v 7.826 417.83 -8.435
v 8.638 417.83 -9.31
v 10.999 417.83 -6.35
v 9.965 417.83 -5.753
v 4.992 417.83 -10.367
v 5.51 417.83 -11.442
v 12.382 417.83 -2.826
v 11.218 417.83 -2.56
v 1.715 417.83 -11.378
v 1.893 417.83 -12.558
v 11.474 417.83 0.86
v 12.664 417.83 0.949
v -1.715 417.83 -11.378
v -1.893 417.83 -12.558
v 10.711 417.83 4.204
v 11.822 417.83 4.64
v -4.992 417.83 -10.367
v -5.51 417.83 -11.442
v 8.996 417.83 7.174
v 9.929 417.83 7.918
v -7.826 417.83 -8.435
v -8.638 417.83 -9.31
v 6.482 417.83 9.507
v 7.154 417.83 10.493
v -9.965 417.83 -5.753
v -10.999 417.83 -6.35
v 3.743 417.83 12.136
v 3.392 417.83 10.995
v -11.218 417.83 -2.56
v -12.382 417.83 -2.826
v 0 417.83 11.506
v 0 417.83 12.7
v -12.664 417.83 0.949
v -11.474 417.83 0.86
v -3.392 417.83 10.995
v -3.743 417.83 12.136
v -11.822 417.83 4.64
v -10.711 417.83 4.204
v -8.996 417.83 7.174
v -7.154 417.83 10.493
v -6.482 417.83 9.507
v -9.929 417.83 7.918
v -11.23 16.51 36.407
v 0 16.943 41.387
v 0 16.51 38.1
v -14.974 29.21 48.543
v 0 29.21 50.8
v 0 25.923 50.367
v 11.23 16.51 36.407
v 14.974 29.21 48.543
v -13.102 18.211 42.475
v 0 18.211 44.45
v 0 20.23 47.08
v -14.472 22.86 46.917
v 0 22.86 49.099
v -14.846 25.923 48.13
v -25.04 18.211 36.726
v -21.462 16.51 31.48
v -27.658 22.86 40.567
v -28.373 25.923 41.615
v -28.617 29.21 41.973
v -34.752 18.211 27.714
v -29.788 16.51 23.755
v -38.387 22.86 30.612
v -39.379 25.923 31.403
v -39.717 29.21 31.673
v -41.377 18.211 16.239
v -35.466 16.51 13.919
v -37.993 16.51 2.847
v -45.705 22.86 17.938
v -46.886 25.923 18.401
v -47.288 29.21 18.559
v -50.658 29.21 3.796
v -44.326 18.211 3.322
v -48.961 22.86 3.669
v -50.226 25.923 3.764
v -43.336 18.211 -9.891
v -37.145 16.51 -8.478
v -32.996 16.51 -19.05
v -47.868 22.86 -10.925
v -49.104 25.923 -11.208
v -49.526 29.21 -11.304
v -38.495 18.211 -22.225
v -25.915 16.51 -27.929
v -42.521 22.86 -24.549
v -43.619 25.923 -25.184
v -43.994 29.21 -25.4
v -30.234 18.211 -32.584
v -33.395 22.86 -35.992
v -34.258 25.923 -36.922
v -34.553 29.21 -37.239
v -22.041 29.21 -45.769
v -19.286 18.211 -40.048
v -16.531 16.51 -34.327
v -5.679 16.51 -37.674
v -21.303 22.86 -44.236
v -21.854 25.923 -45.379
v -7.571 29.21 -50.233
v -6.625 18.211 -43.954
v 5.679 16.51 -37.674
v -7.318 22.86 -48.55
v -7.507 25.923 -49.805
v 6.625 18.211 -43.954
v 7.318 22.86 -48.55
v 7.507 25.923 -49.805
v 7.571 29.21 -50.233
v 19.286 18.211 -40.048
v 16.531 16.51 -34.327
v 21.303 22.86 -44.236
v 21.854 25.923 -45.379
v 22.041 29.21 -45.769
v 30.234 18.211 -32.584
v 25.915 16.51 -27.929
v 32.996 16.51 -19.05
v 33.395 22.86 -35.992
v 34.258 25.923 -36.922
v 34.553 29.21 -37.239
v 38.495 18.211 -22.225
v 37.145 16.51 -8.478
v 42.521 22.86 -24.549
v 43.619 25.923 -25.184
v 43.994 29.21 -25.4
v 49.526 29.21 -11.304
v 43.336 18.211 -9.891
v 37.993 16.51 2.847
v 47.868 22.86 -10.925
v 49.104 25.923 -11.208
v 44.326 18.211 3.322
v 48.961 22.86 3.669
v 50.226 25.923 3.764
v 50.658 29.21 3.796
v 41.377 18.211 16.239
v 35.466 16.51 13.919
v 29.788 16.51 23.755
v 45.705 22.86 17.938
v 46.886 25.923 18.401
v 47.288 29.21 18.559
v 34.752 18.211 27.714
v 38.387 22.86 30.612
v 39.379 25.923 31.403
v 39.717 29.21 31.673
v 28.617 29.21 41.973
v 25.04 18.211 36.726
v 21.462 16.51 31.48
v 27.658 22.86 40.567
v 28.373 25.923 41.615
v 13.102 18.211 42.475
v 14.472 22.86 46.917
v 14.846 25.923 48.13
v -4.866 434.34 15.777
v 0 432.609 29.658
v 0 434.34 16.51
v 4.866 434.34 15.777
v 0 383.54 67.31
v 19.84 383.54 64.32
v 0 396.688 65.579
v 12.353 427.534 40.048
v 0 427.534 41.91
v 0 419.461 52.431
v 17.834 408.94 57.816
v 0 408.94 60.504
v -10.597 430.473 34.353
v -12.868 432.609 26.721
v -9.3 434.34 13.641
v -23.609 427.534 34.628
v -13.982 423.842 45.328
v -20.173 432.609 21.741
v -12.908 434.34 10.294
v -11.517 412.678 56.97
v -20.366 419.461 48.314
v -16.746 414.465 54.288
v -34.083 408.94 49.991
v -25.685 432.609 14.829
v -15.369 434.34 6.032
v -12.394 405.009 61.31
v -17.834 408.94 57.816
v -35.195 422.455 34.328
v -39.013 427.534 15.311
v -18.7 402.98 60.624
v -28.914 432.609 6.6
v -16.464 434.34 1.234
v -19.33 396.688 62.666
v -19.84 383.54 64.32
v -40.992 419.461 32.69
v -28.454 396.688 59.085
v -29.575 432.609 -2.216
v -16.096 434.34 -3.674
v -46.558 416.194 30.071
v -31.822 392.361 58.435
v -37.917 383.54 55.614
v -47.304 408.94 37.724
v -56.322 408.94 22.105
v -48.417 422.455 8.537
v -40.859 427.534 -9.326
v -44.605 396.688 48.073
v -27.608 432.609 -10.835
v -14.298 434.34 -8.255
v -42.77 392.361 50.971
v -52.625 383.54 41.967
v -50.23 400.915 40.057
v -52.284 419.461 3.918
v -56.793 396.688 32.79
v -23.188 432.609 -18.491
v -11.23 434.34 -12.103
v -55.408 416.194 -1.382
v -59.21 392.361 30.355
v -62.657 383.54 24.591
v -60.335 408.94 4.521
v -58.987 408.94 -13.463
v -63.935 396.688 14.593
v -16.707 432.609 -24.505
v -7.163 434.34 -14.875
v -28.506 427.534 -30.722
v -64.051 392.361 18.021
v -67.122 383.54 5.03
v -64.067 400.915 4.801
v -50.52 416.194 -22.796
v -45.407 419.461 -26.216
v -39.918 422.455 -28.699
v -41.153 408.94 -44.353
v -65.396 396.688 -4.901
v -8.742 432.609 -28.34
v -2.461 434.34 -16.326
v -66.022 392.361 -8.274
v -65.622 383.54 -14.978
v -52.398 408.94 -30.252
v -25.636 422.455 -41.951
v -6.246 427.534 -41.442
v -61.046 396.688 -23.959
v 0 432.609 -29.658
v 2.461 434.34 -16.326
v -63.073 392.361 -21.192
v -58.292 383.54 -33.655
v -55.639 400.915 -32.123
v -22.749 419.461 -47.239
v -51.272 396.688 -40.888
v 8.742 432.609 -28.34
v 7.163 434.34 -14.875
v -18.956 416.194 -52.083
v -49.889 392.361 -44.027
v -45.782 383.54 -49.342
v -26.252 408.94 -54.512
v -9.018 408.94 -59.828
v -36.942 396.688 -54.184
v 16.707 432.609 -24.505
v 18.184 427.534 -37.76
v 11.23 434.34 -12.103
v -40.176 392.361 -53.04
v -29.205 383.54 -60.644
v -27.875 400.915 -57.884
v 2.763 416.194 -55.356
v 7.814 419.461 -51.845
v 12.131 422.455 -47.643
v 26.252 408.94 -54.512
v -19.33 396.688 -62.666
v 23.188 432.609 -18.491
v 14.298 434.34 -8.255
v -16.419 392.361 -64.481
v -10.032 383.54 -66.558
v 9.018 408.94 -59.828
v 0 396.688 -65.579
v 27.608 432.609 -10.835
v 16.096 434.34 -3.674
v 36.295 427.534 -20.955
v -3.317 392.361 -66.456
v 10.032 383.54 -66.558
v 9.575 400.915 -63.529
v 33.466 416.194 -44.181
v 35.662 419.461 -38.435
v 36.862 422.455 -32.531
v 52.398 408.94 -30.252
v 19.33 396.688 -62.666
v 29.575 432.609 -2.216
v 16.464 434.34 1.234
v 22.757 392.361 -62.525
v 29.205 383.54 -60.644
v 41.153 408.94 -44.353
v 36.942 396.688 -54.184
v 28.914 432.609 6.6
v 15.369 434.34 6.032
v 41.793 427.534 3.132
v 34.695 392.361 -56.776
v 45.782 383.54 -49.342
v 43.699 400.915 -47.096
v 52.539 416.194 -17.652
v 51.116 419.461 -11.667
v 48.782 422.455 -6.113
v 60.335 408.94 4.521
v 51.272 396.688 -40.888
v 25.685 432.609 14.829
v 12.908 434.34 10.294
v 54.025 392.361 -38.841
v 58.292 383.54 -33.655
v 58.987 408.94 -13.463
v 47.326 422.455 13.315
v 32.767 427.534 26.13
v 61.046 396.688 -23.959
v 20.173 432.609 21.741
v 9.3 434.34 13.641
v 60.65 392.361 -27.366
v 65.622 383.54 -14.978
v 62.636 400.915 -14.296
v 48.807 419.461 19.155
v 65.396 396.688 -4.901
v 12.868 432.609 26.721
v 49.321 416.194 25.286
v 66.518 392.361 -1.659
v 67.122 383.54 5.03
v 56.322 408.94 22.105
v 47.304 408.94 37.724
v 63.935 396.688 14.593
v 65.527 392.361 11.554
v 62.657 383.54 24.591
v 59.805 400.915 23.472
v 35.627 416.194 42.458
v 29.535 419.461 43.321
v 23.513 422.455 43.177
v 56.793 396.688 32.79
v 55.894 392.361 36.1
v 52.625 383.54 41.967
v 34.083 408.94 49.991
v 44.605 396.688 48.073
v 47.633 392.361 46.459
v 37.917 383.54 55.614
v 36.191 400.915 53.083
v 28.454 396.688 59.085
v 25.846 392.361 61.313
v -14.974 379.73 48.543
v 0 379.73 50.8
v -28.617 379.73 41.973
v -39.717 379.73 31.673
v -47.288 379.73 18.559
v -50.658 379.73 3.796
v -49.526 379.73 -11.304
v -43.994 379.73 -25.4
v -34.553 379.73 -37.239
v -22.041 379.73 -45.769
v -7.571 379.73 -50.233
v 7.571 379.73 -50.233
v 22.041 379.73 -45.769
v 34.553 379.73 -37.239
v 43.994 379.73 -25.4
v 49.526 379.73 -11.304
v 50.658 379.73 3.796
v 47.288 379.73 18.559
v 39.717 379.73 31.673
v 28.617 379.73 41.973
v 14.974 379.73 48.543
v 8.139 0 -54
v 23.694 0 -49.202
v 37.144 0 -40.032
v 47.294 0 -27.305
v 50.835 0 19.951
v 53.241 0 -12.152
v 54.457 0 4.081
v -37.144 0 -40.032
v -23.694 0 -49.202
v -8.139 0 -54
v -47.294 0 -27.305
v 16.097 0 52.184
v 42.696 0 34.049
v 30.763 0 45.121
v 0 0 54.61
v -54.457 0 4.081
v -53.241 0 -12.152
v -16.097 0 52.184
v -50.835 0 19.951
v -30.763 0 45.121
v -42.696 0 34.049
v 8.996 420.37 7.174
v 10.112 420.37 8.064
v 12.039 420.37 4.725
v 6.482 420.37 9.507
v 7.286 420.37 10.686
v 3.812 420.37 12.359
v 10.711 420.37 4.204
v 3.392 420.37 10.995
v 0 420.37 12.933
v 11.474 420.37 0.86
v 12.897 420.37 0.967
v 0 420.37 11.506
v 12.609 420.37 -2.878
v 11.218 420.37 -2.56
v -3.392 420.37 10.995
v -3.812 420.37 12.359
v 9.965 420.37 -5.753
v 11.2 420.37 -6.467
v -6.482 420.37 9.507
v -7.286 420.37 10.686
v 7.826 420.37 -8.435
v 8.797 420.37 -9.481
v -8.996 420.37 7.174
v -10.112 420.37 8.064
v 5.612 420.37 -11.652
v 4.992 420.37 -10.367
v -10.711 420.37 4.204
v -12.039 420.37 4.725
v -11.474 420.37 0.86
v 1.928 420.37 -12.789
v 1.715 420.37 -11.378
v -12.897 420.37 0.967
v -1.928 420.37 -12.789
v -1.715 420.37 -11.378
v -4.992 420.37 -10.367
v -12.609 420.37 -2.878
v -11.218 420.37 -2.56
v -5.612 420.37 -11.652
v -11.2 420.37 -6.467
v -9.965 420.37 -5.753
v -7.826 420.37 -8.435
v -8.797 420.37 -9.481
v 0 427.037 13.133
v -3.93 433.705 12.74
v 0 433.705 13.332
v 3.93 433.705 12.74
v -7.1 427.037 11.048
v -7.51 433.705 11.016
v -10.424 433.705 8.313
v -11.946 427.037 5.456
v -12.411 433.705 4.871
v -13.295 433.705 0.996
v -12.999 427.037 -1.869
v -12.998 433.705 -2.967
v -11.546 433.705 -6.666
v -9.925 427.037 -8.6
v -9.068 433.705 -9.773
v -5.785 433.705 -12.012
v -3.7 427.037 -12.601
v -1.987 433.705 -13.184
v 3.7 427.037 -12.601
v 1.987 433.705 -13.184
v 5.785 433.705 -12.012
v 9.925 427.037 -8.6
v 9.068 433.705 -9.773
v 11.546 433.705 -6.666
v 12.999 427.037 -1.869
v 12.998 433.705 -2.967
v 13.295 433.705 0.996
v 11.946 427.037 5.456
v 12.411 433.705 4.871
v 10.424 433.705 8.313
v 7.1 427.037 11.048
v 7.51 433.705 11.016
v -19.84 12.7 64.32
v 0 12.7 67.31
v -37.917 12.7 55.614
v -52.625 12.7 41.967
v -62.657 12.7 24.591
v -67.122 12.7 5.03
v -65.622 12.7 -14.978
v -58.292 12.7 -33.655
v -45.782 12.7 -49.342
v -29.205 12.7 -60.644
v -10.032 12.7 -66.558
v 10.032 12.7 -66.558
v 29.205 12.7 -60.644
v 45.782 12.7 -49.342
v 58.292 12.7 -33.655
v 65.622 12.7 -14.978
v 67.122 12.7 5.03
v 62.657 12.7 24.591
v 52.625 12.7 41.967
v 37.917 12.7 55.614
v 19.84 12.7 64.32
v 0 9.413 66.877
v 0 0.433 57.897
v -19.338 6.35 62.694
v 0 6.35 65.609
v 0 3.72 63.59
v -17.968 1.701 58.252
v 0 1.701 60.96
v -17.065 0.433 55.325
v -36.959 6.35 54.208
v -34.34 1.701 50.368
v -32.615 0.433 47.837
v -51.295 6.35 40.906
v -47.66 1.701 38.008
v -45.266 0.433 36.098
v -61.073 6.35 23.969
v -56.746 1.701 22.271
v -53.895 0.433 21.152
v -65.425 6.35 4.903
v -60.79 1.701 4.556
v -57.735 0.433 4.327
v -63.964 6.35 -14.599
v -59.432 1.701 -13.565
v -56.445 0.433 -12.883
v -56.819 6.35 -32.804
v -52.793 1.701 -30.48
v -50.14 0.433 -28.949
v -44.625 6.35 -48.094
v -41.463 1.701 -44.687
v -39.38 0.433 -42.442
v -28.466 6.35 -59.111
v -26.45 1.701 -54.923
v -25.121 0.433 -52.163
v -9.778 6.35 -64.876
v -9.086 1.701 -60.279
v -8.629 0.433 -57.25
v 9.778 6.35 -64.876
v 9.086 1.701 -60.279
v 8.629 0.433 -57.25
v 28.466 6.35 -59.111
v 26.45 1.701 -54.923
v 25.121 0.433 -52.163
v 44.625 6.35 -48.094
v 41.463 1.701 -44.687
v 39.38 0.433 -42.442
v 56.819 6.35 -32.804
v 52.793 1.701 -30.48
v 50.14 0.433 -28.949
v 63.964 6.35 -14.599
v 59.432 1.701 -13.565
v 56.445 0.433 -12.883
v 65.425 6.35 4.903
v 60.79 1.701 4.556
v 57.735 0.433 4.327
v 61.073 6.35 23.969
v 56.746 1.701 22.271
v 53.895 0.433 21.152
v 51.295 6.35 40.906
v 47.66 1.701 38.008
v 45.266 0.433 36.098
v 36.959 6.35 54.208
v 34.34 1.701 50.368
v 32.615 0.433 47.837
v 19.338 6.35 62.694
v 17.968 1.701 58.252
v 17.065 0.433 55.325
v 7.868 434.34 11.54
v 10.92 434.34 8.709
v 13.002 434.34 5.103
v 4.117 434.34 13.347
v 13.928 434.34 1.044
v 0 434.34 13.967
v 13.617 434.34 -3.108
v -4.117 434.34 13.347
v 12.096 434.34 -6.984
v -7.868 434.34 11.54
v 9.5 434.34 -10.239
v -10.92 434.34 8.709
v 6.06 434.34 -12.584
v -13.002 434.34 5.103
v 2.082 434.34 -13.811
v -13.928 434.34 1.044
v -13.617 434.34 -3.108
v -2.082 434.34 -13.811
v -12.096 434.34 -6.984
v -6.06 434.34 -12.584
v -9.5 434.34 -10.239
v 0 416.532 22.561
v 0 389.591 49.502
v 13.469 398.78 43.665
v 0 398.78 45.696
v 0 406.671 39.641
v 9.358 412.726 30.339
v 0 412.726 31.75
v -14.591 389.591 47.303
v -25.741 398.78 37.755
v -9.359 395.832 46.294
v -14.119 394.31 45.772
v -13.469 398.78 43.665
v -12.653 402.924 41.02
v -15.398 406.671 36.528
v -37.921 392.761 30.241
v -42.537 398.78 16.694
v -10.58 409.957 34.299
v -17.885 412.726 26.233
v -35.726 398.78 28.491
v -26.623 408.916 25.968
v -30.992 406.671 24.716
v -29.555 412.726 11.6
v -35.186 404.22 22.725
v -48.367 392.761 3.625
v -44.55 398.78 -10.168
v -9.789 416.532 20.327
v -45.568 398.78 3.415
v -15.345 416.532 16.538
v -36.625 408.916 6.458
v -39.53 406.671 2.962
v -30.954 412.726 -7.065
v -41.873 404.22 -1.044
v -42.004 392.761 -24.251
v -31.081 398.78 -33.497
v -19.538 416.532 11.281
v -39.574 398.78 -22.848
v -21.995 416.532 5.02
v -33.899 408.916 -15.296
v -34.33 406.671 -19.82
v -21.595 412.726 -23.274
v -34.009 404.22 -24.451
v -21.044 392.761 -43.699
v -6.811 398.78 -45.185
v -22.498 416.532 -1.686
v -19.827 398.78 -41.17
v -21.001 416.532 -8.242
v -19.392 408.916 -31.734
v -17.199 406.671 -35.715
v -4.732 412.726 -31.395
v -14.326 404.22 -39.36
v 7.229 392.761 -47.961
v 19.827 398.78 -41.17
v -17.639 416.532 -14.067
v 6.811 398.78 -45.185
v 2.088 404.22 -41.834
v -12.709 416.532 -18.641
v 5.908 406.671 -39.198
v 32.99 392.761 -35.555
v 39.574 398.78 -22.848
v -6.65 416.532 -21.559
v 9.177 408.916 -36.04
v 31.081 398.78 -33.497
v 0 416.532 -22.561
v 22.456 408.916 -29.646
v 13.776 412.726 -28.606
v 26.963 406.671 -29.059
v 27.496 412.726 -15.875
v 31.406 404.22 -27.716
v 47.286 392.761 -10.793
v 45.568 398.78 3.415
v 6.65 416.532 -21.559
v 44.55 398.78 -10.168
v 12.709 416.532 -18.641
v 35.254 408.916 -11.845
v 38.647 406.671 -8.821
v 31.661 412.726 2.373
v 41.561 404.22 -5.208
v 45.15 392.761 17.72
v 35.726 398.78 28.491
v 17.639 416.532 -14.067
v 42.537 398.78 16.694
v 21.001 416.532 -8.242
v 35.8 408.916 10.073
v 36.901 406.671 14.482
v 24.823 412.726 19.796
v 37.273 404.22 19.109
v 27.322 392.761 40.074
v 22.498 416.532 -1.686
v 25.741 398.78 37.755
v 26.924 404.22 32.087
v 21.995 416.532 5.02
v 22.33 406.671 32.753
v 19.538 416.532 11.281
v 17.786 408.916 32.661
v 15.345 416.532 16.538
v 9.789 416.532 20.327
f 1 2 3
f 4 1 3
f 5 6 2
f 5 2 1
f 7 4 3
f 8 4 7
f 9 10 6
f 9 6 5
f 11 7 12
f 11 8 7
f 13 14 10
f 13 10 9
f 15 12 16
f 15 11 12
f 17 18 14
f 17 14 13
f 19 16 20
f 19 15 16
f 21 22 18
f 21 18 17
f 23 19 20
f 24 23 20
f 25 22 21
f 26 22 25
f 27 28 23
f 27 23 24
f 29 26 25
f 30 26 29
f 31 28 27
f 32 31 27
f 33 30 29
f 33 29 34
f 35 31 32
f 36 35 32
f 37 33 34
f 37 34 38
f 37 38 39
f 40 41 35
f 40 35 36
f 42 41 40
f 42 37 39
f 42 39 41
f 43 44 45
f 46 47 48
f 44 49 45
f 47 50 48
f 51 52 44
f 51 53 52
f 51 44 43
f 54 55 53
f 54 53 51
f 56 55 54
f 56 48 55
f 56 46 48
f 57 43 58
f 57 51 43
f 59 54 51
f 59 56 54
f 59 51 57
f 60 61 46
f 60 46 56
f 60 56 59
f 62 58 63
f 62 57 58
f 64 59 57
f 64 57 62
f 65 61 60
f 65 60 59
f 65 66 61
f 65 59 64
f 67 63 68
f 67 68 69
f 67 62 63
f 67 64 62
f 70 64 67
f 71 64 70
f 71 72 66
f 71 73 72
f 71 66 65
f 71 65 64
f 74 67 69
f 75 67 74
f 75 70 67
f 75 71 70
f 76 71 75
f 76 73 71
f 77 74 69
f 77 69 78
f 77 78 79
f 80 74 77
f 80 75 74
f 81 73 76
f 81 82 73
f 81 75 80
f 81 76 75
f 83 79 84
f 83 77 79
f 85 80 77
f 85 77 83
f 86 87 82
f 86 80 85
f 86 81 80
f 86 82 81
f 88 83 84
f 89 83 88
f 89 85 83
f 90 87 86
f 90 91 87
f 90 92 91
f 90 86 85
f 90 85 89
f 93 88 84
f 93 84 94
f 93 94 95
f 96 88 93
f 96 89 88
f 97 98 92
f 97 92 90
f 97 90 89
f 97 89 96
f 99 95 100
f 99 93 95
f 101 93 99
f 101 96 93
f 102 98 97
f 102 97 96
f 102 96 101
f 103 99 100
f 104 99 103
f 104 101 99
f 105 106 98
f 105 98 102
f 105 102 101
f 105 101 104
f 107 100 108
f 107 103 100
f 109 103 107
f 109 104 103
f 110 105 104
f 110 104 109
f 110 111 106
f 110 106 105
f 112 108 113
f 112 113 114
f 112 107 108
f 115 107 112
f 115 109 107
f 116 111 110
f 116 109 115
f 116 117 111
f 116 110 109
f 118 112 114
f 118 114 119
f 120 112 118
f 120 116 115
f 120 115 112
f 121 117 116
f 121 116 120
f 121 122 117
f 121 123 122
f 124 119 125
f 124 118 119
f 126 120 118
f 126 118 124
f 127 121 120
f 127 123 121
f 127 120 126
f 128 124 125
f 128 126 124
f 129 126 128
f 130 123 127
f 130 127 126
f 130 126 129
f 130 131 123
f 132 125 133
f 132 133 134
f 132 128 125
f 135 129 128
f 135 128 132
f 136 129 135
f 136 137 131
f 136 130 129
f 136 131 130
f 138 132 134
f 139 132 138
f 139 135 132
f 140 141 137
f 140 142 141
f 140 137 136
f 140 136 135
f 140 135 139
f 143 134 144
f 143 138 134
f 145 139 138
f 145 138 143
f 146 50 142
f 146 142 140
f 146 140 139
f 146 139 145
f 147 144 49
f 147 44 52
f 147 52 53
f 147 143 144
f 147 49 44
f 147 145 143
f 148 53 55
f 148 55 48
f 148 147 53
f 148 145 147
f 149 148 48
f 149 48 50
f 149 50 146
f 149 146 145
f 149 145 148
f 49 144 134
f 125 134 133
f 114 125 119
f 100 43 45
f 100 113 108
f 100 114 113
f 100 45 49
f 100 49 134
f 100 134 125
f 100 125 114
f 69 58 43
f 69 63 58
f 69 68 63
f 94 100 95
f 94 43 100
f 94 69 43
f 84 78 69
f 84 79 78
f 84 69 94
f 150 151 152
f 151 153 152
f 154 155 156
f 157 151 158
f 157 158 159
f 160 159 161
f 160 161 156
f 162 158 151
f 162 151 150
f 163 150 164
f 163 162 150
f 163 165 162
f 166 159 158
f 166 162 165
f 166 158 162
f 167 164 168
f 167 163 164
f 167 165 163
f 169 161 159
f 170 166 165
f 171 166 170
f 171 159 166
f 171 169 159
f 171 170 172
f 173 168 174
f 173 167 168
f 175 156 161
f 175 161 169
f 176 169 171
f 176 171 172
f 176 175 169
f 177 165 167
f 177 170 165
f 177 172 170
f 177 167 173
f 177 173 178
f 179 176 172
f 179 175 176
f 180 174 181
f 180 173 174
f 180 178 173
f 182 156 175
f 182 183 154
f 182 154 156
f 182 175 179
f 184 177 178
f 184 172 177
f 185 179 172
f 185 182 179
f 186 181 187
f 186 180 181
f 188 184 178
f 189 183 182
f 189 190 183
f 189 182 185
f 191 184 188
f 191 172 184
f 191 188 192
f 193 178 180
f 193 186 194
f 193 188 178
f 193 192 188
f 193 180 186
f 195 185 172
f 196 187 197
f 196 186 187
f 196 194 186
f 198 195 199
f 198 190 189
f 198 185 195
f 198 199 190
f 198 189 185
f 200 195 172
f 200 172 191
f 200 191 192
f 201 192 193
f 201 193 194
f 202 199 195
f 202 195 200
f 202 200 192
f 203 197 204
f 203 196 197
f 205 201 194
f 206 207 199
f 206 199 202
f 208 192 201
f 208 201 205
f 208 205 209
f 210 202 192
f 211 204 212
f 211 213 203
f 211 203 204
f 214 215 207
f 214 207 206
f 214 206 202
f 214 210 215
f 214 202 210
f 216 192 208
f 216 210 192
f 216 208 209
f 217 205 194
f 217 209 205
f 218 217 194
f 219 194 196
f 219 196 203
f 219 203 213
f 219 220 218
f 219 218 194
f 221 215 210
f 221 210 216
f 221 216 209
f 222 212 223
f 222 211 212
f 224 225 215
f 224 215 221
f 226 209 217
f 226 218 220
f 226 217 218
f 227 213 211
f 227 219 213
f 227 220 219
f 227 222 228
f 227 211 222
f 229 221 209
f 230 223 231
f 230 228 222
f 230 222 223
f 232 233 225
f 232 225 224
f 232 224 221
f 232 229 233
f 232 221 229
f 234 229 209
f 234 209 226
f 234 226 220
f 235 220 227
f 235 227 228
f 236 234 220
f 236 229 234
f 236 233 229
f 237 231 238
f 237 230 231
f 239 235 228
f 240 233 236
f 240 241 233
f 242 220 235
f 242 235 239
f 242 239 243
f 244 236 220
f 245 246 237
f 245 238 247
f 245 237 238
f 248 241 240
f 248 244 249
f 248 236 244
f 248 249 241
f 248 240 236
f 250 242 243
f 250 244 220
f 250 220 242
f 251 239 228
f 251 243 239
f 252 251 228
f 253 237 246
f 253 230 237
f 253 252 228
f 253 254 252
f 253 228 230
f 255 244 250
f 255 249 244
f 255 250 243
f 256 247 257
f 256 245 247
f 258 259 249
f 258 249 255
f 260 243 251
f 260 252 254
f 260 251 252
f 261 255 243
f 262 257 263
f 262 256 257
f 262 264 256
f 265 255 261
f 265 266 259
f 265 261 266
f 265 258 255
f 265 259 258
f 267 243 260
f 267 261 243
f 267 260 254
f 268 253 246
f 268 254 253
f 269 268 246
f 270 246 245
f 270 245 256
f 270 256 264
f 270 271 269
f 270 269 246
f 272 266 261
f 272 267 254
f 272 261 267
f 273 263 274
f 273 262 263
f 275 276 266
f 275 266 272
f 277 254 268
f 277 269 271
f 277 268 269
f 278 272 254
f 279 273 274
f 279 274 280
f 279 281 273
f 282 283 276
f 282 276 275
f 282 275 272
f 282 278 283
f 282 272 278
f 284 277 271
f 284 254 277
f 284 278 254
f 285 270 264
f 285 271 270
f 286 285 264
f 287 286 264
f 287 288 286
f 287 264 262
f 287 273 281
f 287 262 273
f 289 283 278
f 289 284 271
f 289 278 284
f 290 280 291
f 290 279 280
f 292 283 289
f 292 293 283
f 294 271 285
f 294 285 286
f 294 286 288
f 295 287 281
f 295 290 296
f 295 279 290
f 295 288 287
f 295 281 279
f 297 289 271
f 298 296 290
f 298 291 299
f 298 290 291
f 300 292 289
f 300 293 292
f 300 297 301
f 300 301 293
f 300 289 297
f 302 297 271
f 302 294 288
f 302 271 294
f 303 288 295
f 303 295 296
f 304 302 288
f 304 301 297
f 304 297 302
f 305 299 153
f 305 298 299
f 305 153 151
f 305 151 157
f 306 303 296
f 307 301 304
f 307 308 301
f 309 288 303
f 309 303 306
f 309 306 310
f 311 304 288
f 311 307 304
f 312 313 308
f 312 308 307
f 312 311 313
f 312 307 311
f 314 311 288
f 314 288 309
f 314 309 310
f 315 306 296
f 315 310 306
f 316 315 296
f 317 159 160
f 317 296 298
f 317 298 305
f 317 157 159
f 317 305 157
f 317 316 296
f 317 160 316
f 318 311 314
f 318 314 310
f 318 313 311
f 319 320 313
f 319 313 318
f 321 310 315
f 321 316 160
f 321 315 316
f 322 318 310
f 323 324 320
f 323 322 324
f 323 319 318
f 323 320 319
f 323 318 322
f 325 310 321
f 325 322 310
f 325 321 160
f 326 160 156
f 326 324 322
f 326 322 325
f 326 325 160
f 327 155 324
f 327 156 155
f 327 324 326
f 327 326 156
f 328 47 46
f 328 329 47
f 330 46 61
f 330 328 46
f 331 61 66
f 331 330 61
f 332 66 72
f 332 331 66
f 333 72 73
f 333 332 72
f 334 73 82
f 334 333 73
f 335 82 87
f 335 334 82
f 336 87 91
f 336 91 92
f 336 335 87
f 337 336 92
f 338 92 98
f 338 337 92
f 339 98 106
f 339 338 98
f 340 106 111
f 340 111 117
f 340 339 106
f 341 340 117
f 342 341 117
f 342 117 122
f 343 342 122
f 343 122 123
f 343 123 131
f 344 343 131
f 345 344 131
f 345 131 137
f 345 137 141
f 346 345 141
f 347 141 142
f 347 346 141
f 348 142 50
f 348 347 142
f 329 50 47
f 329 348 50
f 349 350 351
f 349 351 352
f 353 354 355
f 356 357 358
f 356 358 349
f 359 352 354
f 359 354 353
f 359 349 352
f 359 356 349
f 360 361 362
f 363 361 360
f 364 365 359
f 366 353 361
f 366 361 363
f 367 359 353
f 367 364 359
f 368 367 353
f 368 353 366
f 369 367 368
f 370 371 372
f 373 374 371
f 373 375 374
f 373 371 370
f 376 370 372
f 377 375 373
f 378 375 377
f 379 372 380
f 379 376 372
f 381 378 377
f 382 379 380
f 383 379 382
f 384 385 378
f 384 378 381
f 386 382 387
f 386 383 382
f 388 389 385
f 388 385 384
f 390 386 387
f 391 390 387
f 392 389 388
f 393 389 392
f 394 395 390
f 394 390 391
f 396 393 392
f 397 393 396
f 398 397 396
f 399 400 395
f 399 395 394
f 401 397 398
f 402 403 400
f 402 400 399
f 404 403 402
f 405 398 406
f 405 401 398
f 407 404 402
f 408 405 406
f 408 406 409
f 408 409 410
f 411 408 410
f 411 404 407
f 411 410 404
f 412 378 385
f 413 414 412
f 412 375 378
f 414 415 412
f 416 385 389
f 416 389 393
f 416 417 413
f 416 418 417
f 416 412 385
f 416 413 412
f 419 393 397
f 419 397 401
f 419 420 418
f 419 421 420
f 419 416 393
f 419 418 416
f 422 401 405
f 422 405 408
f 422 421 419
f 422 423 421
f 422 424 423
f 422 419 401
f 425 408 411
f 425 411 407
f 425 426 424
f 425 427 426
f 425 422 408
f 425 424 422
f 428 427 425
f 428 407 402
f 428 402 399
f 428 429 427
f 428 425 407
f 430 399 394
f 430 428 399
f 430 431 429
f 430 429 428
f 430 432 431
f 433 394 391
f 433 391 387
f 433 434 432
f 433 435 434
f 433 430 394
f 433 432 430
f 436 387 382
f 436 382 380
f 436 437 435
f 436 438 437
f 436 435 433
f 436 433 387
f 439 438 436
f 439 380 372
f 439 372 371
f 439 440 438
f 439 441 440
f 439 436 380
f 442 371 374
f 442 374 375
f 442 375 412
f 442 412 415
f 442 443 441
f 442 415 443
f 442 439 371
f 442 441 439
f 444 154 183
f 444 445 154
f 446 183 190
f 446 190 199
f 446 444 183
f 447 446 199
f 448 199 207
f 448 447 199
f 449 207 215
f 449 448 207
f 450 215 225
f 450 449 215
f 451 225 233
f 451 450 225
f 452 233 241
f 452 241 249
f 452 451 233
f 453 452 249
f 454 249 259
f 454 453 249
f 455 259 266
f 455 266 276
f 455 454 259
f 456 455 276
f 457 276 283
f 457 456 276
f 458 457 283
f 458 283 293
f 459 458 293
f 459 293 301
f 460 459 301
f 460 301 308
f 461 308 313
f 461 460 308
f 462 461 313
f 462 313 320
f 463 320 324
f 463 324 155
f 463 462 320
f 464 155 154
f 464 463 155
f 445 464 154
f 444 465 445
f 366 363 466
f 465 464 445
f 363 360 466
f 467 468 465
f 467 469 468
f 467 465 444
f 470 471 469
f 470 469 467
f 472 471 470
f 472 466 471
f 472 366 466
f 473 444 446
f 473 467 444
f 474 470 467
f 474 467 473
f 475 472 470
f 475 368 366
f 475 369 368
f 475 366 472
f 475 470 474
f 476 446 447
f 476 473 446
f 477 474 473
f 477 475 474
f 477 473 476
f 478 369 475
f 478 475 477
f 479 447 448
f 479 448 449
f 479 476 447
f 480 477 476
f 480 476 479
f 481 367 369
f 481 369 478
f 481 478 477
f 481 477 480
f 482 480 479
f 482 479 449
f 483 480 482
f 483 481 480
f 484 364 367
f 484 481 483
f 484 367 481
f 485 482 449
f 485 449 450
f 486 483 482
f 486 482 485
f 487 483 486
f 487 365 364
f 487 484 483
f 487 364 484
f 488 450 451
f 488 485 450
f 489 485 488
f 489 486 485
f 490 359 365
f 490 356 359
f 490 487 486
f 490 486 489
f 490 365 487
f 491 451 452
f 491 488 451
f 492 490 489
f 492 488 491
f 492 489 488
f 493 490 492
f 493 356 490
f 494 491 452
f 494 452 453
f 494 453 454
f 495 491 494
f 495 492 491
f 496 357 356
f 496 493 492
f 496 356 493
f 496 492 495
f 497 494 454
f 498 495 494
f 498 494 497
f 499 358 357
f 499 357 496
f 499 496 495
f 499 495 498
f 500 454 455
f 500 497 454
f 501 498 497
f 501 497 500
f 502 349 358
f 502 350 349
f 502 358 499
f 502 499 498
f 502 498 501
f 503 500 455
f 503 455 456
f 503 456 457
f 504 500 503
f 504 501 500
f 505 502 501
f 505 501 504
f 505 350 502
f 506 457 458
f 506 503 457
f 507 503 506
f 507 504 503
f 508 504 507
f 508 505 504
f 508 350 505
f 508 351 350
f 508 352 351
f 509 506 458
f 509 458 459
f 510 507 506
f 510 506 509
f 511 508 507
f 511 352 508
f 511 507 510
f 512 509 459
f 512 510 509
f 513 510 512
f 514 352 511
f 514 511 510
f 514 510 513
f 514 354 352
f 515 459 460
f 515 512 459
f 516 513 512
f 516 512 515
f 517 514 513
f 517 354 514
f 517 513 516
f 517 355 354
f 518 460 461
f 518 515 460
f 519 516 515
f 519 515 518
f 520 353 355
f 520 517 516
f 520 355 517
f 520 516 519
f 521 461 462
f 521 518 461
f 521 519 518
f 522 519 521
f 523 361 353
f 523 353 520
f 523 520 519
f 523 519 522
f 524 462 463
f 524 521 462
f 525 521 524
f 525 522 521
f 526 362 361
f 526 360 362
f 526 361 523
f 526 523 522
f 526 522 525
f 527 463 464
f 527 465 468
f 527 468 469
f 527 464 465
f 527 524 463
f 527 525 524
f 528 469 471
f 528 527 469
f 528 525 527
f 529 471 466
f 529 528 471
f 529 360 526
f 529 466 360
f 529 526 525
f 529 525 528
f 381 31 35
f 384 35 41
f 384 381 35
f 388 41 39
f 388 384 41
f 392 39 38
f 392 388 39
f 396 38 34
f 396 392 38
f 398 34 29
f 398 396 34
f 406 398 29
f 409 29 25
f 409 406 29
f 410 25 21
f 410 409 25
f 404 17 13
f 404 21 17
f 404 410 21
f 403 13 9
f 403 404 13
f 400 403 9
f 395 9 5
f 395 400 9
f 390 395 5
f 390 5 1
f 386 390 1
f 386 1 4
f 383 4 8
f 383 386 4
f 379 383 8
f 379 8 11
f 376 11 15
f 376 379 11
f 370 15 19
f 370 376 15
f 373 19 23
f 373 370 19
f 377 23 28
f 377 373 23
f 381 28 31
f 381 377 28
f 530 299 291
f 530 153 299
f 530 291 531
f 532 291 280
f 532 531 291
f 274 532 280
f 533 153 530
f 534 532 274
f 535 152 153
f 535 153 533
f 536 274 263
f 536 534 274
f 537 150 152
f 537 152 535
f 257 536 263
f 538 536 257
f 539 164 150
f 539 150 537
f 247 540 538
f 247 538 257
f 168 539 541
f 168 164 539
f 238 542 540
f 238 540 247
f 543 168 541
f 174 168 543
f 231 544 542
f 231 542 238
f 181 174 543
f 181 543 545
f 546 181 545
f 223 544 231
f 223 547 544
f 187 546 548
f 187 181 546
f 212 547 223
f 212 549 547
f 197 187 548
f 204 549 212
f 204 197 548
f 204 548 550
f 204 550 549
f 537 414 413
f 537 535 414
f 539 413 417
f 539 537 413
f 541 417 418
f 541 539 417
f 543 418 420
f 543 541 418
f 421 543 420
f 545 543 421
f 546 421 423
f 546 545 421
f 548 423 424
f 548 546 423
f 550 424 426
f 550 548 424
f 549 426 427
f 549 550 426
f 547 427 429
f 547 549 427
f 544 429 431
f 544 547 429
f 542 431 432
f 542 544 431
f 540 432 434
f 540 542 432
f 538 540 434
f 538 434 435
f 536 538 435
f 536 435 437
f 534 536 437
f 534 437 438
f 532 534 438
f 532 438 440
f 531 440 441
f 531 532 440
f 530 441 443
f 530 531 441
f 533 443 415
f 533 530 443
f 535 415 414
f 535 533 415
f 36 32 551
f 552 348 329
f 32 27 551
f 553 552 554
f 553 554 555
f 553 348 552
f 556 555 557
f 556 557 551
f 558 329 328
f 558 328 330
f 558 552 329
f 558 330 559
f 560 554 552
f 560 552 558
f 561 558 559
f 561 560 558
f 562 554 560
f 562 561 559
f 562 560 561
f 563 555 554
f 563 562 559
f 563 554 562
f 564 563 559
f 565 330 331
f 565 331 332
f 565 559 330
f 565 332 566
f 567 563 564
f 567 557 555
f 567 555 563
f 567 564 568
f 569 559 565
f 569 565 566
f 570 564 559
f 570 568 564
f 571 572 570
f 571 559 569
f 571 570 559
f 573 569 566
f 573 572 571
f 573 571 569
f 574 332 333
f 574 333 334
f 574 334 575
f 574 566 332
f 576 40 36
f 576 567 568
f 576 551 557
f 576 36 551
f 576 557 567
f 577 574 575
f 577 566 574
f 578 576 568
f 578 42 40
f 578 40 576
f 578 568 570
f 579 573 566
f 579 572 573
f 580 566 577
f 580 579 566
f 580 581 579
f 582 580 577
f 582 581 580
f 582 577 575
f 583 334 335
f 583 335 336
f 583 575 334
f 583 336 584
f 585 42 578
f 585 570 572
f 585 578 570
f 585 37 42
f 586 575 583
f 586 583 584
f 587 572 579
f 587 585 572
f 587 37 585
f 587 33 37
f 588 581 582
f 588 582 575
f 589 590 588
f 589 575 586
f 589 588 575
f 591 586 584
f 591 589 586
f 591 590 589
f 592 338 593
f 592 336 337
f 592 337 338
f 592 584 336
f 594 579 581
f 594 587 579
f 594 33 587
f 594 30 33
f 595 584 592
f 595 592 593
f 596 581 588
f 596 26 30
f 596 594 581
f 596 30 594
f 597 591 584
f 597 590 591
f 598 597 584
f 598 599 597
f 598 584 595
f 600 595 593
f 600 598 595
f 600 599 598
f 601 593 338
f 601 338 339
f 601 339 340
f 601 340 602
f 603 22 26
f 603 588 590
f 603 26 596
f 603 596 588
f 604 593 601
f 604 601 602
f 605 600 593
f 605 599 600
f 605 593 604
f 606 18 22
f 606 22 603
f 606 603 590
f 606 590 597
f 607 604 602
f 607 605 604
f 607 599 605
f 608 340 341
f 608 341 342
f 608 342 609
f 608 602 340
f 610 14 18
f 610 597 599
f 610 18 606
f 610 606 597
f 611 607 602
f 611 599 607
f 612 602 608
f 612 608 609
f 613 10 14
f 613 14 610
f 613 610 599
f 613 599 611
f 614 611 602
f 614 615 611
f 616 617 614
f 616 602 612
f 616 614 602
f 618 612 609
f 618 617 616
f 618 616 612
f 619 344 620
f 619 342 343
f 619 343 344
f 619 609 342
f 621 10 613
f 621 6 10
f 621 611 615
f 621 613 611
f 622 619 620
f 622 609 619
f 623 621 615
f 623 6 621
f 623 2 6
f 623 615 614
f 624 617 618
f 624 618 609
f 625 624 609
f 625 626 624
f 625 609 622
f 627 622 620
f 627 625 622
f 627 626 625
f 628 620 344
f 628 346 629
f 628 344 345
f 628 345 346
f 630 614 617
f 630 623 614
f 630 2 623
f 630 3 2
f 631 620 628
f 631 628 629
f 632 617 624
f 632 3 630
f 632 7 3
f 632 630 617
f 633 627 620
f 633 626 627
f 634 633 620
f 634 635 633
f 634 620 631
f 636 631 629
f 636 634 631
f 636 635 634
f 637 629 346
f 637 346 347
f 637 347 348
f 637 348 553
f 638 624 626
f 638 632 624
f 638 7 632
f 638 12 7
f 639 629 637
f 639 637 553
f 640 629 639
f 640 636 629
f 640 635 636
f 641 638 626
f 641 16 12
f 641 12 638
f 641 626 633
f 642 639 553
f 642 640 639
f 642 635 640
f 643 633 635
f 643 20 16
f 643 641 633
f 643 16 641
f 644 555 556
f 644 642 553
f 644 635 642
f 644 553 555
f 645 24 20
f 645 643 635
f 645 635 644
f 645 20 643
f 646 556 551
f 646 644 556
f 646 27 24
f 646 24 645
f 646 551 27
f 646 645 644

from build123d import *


with BuildPart() as part:
    # Sketch4 → Revolve1 (revolve)
    with BuildSketch(Plane(origin=(0, 0, 0), x_dir=(0, 0, -1), z_dir=(1, 0, 0))):
        with BuildLine():
            Line((-54.61, 0), (0, 0))
            Line((0, 0), (0, 16.51))
            Line((0, 16.51), (-38.1, 16.51))
            ThreePointArc((-38.1, 16.51), (-47.080256121, 20.229743879), (-50.8, 29.21))
            Line((-50.8, 29.21), (-50.8, 379.73))
            ThreePointArc((-50.8, 379.73), (-39.640768363, 406.670768363), (-12.7, 417.83))
            Line((-12.7, 417.83), (0, 417.83))
            Line((0, 417.83), (0, 434.34))
            Line((0, 434.34), (-16.51, 434.34))
            ThreePointArc((-16.51, 434.34), (-52.431024484, 419.461024484), (-67.31, 383.54))
            Line((-67.31, 383.54), (-67.31, 12.7))
            ThreePointArc((-67.31, 12.7), (-63.590256121, 3.719743879), (-54.61, 0))
        make_face()
    revolve(axis=Axis((0, 434.34, 0), (0, -1, 0)))

    # Sketch6 → 3/4 NPT Tapped Hole2 (revolve, cut)
    with BuildSketch(Plane(origin=(0, 434.34, 0), x_dir=(0, 0, 1), z_dir=(1, 0, 0))):
        Polygon((0, 0), (0, 30.027622455), (11.5062, 23.114), (11.5062, 13.97), (12.933217642, 13.97), (13.3324854, 0.635), (13.9674854, 0), align=None)
    revolve(axis=Axis((0, 440.69, 0), (0, -1, 0)), mode=Mode.SUBTRACT)


solid = part.part
